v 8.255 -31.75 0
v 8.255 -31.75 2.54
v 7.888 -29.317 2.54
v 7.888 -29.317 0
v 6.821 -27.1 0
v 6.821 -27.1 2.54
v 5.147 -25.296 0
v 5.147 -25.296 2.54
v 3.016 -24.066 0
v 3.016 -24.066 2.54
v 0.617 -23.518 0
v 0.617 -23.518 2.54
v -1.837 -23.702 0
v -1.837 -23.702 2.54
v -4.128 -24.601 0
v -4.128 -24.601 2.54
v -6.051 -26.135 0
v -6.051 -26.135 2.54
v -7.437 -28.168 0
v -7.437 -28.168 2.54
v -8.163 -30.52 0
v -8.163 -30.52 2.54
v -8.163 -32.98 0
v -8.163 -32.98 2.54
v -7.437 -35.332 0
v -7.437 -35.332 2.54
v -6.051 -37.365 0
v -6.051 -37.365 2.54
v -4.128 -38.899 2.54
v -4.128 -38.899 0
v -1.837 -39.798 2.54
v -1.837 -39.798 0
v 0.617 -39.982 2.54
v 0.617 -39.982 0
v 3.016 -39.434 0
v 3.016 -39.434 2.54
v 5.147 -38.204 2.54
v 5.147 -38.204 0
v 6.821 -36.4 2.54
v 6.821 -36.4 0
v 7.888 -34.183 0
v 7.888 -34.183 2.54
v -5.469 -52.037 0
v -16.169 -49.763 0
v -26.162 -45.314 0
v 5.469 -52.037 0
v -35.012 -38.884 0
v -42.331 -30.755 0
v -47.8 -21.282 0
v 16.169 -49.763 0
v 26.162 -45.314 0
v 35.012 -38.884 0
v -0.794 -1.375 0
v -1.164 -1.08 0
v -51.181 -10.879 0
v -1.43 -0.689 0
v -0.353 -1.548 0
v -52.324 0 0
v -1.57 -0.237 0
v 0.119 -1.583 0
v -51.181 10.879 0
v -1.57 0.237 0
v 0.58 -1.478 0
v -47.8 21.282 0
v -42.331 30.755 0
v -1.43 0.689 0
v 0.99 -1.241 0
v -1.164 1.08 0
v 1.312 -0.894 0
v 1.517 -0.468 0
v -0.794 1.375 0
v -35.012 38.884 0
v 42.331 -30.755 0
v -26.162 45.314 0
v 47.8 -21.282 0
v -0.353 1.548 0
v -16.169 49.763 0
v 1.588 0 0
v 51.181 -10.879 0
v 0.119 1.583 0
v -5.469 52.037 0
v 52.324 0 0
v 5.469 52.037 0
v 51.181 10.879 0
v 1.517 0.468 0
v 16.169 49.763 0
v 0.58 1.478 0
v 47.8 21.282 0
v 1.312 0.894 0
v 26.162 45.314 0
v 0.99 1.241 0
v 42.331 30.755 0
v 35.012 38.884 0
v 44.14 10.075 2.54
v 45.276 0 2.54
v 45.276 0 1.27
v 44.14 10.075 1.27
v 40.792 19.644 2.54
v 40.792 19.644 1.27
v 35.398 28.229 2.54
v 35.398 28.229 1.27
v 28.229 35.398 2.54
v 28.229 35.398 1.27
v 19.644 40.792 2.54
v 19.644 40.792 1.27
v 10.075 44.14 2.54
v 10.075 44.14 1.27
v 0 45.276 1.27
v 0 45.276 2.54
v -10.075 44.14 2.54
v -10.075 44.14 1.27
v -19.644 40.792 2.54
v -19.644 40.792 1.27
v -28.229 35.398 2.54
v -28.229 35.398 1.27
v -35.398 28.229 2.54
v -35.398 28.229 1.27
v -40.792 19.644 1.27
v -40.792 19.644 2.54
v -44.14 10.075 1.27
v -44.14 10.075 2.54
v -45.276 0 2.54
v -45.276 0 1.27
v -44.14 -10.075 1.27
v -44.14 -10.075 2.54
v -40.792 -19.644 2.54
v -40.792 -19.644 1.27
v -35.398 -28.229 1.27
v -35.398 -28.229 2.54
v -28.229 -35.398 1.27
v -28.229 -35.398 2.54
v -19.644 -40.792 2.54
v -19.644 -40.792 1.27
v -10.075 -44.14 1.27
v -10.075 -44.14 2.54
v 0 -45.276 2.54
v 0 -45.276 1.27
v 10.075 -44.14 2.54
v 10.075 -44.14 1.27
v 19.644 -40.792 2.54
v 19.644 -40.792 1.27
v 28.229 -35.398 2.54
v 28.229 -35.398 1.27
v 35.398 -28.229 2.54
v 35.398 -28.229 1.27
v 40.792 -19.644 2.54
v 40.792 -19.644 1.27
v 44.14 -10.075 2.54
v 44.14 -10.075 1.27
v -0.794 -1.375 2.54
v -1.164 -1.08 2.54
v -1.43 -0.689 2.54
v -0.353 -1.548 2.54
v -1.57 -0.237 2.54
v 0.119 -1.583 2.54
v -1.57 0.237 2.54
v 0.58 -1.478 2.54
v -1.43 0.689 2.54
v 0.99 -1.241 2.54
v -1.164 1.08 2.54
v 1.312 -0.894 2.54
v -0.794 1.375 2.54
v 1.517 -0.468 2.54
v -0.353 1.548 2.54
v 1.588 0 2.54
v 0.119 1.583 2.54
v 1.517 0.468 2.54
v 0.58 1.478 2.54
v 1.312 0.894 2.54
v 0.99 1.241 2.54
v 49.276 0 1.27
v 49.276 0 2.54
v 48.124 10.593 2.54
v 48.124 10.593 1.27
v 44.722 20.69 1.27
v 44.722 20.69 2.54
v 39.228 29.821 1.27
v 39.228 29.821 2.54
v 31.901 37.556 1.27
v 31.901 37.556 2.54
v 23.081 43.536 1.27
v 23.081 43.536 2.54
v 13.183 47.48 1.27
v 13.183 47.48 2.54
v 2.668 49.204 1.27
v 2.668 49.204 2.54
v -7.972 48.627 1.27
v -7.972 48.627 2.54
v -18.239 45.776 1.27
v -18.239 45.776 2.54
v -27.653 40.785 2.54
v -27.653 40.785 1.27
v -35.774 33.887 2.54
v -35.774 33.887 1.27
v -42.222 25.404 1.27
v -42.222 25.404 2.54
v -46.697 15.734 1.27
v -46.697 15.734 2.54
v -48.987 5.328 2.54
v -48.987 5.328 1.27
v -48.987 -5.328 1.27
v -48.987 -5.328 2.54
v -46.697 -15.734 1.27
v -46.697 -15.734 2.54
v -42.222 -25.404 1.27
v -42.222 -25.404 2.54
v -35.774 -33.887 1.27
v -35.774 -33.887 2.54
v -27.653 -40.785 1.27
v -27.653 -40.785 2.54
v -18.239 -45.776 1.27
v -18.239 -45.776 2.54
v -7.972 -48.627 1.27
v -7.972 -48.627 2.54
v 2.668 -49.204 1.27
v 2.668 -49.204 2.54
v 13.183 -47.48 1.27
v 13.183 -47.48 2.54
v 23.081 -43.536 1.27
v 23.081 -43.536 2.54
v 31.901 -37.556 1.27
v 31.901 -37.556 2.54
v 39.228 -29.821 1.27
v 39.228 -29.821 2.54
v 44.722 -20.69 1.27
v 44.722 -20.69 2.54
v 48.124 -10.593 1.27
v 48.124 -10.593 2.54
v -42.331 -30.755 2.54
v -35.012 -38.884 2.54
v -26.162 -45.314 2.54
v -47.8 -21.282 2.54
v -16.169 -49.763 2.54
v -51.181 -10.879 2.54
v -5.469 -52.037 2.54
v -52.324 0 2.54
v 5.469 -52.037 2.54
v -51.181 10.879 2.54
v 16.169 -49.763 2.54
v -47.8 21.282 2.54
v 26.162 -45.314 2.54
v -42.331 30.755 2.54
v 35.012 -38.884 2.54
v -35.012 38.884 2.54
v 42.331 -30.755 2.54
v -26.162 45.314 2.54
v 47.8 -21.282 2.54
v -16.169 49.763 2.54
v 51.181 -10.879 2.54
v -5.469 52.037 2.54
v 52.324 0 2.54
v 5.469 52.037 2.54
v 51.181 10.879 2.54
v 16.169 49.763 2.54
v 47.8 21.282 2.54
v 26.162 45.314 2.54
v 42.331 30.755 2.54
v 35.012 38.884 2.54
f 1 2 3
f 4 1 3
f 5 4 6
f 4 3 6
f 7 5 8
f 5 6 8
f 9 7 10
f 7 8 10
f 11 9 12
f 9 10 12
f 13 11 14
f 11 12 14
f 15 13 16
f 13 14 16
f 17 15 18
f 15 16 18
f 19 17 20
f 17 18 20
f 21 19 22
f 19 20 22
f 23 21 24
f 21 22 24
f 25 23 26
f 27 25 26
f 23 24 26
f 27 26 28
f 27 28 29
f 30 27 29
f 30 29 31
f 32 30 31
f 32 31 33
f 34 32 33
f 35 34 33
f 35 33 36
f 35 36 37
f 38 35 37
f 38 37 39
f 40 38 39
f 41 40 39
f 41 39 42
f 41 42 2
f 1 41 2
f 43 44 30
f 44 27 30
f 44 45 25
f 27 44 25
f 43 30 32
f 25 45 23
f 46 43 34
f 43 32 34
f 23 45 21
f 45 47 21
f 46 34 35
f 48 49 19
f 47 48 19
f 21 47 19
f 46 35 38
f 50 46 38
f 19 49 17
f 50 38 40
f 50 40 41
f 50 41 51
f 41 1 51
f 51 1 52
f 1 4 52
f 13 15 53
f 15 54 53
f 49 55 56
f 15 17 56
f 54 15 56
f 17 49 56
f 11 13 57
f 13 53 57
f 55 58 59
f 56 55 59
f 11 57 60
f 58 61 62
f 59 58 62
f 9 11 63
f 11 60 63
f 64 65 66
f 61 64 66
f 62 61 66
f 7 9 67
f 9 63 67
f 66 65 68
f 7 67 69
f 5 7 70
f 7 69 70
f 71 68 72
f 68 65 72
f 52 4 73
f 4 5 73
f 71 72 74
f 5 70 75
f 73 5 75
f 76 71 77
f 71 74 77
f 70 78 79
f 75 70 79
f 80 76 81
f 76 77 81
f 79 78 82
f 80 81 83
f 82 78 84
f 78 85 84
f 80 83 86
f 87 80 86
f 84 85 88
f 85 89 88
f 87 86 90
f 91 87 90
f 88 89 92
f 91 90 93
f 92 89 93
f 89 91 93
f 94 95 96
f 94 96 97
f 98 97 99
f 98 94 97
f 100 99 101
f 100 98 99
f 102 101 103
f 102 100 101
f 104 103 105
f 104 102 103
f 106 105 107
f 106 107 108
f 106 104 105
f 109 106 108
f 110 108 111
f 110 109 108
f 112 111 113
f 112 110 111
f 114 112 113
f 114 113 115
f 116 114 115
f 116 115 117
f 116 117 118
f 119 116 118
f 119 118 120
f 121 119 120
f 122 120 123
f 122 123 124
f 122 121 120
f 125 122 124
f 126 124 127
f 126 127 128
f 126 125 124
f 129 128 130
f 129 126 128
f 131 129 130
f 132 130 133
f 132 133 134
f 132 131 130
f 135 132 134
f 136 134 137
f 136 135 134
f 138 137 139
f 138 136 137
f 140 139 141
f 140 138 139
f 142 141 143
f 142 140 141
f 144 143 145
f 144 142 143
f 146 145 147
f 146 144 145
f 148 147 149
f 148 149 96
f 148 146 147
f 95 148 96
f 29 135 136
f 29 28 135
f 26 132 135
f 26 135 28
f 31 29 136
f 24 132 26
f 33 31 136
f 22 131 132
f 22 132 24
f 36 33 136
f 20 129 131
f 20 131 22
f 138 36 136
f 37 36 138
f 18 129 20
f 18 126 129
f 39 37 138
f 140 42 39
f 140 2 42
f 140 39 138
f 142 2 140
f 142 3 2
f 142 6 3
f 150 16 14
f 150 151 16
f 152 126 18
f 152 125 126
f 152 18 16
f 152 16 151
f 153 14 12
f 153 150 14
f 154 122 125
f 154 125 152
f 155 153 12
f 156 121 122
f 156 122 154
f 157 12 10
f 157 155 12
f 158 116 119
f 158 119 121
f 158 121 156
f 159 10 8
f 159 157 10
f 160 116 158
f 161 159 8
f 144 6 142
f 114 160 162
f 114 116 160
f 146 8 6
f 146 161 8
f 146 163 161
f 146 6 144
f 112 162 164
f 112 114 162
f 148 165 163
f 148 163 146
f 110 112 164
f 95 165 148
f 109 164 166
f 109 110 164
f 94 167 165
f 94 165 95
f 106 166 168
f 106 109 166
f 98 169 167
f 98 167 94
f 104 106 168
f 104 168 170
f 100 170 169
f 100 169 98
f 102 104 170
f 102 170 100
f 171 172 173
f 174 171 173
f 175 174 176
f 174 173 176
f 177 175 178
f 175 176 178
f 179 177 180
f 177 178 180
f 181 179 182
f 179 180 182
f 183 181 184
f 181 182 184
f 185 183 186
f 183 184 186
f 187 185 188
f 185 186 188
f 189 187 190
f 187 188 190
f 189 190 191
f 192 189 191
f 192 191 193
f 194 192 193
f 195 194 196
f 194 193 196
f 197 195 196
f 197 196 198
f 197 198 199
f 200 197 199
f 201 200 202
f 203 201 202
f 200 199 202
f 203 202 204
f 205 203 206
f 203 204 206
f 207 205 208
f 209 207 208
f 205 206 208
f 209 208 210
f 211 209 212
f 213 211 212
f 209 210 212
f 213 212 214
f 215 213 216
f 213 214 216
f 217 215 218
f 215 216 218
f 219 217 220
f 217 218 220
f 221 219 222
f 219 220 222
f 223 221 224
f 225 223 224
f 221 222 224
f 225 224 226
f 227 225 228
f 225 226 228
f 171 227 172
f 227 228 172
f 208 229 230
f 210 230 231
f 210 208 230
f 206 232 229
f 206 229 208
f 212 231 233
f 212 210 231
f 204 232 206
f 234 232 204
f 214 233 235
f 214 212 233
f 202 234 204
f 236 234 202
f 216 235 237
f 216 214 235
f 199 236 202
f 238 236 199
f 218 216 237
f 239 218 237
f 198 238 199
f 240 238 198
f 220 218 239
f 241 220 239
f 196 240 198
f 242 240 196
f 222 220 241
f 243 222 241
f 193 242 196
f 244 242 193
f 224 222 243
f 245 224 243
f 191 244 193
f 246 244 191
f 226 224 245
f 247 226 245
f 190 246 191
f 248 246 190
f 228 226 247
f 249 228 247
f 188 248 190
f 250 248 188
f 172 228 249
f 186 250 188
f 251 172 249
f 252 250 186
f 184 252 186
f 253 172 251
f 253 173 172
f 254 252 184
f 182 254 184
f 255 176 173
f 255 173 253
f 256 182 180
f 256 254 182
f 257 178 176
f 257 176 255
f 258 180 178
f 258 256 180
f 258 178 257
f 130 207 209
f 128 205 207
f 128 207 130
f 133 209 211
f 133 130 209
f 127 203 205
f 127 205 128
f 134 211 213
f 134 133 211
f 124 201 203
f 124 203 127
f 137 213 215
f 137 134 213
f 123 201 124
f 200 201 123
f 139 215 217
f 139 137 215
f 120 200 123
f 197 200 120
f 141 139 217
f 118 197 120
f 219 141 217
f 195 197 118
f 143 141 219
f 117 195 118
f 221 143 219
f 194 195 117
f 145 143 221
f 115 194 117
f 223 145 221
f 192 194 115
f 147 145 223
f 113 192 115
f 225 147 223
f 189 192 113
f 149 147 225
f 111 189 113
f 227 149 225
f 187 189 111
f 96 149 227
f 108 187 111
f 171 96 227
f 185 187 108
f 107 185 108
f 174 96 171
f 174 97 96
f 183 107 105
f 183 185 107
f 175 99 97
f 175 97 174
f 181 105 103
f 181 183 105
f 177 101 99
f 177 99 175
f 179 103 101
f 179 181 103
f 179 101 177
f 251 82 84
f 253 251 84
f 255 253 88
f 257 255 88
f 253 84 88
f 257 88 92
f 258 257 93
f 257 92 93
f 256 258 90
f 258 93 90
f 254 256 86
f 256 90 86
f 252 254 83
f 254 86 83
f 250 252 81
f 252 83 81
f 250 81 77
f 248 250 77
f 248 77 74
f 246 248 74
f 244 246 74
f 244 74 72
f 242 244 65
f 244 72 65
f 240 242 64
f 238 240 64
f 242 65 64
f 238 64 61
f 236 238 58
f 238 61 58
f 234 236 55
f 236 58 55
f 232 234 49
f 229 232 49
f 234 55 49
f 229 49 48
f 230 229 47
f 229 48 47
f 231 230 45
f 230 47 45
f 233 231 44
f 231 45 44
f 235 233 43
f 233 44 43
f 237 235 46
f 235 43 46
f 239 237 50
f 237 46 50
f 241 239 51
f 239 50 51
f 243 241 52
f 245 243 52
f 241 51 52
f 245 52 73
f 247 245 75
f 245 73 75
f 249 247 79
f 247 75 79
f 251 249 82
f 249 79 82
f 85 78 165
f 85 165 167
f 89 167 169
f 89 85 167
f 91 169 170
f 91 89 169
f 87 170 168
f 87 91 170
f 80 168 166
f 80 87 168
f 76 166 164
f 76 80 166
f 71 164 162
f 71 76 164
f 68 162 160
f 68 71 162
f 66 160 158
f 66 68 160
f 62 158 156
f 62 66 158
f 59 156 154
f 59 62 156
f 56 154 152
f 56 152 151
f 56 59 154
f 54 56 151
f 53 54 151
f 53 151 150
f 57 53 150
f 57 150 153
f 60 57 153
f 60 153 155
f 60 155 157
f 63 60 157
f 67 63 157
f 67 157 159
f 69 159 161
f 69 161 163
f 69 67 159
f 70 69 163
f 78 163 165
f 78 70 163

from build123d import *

# Parameters (mm, degrees)
F0_R     = 52.324
F0_R_2   = 1.5875
F1_DEPTH = 2.54
F2_R     = 49.276
F2_R_2   = 45.2755
F3_DEPTH = 1.27
F4_R     = 8.255
F5_DEPTH = 2.541


with BuildPart() as f1:
    # F0 (on Top) → F1 (new body)
    with BuildSketch(Plane.XY):
        Circle(F0_R)
        Circle(F0_R_2, mode=Mode.SUBTRACT)
    extrude(amount=F1_DEPTH)

    # F2 (on face) → F3 (cut)
    with BuildSketch(Plane.XY.offset(2.54)):
        Circle(F2_R)
        Circle(F2_R_2, mode=Mode.SUBTRACT)
    extrude(amount=-F3_DEPTH, mode=Mode.SUBTRACT)

    # F4 (on face) → F5 (cut, through all)
    with BuildSketch(Plane.XY.offset(2.54)):
        with Locations((0, -31.75)):
            Circle(F4_R)
    extrude(amount=-F5_DEPTH, mode=Mode.SUBTRACT)


solid = f1.part
